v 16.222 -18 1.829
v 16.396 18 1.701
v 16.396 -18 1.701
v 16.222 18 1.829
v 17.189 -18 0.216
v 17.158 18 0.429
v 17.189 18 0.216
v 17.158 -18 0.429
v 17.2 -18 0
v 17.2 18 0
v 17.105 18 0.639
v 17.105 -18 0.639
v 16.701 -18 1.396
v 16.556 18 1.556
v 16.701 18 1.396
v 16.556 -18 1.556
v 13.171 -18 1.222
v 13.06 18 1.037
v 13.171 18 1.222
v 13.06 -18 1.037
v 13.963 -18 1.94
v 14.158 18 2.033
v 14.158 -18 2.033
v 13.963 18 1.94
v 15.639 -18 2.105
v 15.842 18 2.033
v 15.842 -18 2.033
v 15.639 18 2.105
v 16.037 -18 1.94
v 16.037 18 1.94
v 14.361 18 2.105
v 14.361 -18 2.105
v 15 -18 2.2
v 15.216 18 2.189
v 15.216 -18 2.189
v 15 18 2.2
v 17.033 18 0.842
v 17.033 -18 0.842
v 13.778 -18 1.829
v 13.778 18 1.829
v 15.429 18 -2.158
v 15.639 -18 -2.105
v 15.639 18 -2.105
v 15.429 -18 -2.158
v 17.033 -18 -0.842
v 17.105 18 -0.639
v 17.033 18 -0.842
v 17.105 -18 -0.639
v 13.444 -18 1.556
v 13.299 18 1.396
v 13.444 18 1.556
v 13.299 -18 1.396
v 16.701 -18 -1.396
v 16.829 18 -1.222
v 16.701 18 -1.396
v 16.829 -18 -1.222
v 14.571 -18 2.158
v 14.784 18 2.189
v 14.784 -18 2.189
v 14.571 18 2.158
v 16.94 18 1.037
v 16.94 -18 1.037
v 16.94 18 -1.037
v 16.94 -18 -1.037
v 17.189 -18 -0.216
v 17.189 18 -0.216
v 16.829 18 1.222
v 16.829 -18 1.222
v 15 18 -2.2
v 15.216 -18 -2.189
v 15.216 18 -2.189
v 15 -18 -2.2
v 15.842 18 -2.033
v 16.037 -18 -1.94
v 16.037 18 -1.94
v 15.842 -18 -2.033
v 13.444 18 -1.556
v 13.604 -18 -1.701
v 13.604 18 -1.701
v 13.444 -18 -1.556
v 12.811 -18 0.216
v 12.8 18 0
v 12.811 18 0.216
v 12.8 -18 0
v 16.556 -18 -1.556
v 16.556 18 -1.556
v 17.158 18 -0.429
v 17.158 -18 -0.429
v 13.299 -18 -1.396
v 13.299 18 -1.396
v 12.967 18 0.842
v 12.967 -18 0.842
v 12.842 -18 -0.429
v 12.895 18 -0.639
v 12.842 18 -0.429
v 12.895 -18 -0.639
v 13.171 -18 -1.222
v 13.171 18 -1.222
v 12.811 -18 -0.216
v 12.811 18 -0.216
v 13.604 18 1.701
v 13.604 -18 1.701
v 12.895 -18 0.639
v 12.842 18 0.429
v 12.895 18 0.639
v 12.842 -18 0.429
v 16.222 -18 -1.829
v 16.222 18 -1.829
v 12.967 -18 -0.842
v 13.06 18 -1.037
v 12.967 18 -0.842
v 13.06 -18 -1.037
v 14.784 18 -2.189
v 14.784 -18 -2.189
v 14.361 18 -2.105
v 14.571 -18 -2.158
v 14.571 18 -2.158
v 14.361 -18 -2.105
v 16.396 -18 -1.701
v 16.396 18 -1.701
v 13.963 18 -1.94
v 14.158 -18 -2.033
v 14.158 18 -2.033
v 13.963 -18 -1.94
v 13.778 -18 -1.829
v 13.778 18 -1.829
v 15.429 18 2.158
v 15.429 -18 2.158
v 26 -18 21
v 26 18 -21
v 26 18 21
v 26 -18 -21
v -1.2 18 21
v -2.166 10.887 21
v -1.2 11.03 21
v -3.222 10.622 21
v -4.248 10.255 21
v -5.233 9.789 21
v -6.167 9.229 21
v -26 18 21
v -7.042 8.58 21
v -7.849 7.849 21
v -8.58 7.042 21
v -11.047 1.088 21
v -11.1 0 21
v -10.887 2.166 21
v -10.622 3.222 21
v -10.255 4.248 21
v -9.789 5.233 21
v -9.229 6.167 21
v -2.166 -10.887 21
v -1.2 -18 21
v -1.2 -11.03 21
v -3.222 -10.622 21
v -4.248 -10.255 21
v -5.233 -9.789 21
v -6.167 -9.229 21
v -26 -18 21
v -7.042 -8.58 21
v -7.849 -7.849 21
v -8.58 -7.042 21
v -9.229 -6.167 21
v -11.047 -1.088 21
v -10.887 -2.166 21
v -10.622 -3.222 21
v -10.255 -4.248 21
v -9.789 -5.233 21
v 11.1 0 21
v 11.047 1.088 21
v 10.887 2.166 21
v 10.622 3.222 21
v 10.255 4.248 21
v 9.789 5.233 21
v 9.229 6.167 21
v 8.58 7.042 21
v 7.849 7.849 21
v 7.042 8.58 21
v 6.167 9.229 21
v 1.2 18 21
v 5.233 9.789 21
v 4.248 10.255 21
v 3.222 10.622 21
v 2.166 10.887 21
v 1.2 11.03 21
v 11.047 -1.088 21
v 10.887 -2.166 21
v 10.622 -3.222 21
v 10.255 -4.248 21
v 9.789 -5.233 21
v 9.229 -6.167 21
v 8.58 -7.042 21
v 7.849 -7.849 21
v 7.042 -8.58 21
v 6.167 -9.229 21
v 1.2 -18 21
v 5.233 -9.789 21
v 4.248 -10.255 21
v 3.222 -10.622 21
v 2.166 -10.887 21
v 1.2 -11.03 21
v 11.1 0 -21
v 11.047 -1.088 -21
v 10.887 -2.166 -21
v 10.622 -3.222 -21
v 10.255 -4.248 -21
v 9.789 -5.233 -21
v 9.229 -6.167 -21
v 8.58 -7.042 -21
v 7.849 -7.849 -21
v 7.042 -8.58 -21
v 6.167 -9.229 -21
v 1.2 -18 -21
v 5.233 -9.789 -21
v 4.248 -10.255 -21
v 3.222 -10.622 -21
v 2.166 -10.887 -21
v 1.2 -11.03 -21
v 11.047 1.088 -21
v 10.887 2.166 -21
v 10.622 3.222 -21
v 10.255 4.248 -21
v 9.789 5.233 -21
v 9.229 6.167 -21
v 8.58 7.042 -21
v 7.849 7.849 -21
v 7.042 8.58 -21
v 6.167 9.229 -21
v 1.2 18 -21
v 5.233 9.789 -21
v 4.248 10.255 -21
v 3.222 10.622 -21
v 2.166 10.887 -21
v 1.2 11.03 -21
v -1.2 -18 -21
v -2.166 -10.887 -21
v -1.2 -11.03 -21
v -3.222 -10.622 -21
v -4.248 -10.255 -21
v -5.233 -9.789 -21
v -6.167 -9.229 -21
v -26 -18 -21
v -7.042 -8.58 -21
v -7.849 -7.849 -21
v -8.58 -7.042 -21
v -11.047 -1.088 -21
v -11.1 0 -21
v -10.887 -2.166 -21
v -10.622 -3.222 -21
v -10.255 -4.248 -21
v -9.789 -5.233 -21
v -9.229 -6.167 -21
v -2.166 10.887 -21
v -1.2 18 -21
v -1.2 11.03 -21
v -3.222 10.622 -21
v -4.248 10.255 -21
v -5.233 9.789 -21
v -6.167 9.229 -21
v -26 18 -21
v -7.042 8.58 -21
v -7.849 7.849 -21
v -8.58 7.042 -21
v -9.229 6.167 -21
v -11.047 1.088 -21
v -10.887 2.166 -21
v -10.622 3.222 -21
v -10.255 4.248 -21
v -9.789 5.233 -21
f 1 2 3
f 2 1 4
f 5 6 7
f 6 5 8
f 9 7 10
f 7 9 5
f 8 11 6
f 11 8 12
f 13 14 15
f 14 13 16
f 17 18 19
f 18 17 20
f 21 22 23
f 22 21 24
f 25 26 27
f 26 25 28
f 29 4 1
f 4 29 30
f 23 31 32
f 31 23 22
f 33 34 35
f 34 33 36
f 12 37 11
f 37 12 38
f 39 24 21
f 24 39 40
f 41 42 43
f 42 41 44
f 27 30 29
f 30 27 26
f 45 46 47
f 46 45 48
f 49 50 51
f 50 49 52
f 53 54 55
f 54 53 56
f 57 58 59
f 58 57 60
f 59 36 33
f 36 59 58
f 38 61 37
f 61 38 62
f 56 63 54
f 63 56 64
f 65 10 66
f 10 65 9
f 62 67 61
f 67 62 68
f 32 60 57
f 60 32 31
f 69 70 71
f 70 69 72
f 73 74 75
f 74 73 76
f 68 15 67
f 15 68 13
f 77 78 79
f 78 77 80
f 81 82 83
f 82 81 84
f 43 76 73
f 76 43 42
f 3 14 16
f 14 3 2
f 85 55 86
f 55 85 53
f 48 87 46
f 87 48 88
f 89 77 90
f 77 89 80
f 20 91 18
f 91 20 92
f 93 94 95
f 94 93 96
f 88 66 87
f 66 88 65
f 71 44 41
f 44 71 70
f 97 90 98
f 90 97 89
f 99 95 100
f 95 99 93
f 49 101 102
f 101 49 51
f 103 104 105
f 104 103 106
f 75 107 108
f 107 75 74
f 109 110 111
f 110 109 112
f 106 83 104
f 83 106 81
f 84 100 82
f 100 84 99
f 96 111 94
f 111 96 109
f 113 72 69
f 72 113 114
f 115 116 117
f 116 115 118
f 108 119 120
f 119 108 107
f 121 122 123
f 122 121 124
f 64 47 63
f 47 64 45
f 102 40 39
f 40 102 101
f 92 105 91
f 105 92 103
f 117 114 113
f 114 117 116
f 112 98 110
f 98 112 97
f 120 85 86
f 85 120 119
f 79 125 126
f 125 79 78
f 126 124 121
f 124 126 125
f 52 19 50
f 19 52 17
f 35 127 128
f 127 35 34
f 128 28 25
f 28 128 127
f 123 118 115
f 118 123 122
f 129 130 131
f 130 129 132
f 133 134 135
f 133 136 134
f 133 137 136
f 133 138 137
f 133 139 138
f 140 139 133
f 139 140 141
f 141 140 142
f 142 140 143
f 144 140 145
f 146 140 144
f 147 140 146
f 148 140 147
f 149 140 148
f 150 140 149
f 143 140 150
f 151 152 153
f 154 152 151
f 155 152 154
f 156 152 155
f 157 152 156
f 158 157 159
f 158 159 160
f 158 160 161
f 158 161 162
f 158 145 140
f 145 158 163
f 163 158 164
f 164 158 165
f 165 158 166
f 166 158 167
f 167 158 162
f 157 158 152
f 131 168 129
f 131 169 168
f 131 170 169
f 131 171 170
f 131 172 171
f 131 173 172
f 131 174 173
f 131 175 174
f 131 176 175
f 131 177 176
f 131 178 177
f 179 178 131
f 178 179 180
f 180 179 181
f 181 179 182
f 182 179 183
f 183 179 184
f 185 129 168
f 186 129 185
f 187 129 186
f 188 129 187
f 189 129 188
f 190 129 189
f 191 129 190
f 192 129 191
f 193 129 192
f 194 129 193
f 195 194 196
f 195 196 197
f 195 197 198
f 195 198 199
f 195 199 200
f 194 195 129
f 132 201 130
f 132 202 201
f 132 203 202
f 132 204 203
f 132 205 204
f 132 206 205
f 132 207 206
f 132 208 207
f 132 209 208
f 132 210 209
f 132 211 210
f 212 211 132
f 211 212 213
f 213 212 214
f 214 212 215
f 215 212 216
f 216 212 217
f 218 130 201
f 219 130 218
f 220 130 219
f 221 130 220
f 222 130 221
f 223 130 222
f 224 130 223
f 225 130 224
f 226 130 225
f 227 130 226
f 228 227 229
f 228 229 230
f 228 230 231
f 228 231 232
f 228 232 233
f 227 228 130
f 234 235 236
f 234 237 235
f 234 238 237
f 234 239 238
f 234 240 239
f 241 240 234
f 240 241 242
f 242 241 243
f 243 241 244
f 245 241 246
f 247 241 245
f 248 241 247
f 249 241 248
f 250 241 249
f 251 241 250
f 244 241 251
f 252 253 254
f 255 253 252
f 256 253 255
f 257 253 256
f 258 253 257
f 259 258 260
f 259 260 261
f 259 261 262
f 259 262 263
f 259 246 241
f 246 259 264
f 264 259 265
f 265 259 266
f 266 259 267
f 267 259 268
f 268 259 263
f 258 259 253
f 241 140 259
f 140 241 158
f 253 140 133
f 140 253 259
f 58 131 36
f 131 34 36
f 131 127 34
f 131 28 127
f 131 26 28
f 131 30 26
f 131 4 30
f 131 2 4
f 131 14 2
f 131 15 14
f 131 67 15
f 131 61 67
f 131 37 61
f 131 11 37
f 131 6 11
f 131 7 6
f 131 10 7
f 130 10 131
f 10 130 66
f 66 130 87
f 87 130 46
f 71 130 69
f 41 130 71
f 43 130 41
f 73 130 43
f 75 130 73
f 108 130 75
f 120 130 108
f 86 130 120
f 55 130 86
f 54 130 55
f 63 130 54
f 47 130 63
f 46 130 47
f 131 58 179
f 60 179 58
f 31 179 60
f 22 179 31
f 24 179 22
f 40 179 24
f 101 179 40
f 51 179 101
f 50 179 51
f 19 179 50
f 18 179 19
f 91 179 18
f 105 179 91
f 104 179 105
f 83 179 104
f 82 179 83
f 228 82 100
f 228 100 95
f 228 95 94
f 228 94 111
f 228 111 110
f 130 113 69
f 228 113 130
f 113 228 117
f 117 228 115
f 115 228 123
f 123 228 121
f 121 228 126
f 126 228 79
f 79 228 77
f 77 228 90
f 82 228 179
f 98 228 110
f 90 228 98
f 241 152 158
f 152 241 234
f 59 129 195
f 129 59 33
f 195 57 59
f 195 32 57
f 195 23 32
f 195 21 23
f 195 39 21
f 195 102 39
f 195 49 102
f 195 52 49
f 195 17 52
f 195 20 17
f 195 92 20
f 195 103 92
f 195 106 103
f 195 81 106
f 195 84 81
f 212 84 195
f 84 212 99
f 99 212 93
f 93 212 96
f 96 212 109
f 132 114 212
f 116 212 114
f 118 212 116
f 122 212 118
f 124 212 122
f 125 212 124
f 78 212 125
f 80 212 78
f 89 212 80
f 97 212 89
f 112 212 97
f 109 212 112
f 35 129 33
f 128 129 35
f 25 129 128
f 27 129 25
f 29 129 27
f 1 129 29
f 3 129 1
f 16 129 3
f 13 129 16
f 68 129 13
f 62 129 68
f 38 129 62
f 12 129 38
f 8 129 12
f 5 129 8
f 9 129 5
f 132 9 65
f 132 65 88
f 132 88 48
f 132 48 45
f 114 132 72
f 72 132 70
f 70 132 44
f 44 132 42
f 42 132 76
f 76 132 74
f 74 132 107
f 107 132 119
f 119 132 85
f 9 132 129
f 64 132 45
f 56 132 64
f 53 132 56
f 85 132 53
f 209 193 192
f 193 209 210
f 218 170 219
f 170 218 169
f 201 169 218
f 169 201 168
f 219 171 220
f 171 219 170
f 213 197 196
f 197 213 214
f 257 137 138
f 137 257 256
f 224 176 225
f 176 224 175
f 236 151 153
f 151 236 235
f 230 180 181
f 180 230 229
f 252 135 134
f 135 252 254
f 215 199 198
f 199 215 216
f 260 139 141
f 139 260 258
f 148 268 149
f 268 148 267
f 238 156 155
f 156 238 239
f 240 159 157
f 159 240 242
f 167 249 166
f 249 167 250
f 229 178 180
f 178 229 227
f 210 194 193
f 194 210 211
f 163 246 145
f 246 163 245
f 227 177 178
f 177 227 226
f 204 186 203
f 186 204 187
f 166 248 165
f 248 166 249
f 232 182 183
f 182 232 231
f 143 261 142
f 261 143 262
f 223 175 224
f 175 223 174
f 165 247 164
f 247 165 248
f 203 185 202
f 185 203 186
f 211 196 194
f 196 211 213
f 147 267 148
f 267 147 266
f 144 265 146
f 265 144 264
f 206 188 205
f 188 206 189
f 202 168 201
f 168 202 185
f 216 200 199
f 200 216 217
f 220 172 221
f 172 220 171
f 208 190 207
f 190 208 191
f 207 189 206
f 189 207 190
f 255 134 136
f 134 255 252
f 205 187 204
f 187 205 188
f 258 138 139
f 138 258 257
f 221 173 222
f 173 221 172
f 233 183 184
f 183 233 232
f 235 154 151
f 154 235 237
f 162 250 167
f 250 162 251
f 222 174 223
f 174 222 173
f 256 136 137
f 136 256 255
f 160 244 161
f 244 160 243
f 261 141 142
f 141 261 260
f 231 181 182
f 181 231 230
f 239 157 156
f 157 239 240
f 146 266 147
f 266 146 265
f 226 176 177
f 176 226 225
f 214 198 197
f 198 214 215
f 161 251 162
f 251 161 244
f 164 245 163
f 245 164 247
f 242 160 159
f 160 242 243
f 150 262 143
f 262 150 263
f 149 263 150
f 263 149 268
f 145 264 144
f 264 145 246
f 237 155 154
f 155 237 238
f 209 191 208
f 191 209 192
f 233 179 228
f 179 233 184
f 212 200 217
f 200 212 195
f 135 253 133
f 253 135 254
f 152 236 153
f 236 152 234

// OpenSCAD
// file: parameters.scad
// 135er Universal Helicopter Controller - Cyclic V1 parameters
$fn = 64;

base_x = 220;
base_y = 180;
base_h = 18;
wall = 5;

shaft_d = 8.2;
bearing_od = 22.2;
bearing_w = 7.2;

gimbal_outer_x = 120;
gimbal_outer_y = 100;
gimbal_bar = 18;
gimbal_h = 18;

tube_od = 22.2;
tube_clamp_wall = 6;

sensor_board_x = 23;
sensor_board_y = 23;
sensor_gap = 2.0;

m4_clearance = 4.4;
m3_clearance = 3.4;
// main file
include <parameters.scad>;

clamp_x = 52;
clamp_y = 36;
clamp_z = 42;

difference(){
    cube([clamp_x,clamp_y,clamp_z],center=true);

    cylinder(h=clamp_z+4,d=tube_od,center=true);

    // Split for clamping.
    translate([-1.2,-30,-30]) cube([2.4,60,60]);

    // Two M4 clamp bolts.
    for (z=[-12,12])
        rotate([90,0,0])
            translate([15,0,z])
                cylinder(h=clamp_y+8,d=m4_clearance,center=true);
}
